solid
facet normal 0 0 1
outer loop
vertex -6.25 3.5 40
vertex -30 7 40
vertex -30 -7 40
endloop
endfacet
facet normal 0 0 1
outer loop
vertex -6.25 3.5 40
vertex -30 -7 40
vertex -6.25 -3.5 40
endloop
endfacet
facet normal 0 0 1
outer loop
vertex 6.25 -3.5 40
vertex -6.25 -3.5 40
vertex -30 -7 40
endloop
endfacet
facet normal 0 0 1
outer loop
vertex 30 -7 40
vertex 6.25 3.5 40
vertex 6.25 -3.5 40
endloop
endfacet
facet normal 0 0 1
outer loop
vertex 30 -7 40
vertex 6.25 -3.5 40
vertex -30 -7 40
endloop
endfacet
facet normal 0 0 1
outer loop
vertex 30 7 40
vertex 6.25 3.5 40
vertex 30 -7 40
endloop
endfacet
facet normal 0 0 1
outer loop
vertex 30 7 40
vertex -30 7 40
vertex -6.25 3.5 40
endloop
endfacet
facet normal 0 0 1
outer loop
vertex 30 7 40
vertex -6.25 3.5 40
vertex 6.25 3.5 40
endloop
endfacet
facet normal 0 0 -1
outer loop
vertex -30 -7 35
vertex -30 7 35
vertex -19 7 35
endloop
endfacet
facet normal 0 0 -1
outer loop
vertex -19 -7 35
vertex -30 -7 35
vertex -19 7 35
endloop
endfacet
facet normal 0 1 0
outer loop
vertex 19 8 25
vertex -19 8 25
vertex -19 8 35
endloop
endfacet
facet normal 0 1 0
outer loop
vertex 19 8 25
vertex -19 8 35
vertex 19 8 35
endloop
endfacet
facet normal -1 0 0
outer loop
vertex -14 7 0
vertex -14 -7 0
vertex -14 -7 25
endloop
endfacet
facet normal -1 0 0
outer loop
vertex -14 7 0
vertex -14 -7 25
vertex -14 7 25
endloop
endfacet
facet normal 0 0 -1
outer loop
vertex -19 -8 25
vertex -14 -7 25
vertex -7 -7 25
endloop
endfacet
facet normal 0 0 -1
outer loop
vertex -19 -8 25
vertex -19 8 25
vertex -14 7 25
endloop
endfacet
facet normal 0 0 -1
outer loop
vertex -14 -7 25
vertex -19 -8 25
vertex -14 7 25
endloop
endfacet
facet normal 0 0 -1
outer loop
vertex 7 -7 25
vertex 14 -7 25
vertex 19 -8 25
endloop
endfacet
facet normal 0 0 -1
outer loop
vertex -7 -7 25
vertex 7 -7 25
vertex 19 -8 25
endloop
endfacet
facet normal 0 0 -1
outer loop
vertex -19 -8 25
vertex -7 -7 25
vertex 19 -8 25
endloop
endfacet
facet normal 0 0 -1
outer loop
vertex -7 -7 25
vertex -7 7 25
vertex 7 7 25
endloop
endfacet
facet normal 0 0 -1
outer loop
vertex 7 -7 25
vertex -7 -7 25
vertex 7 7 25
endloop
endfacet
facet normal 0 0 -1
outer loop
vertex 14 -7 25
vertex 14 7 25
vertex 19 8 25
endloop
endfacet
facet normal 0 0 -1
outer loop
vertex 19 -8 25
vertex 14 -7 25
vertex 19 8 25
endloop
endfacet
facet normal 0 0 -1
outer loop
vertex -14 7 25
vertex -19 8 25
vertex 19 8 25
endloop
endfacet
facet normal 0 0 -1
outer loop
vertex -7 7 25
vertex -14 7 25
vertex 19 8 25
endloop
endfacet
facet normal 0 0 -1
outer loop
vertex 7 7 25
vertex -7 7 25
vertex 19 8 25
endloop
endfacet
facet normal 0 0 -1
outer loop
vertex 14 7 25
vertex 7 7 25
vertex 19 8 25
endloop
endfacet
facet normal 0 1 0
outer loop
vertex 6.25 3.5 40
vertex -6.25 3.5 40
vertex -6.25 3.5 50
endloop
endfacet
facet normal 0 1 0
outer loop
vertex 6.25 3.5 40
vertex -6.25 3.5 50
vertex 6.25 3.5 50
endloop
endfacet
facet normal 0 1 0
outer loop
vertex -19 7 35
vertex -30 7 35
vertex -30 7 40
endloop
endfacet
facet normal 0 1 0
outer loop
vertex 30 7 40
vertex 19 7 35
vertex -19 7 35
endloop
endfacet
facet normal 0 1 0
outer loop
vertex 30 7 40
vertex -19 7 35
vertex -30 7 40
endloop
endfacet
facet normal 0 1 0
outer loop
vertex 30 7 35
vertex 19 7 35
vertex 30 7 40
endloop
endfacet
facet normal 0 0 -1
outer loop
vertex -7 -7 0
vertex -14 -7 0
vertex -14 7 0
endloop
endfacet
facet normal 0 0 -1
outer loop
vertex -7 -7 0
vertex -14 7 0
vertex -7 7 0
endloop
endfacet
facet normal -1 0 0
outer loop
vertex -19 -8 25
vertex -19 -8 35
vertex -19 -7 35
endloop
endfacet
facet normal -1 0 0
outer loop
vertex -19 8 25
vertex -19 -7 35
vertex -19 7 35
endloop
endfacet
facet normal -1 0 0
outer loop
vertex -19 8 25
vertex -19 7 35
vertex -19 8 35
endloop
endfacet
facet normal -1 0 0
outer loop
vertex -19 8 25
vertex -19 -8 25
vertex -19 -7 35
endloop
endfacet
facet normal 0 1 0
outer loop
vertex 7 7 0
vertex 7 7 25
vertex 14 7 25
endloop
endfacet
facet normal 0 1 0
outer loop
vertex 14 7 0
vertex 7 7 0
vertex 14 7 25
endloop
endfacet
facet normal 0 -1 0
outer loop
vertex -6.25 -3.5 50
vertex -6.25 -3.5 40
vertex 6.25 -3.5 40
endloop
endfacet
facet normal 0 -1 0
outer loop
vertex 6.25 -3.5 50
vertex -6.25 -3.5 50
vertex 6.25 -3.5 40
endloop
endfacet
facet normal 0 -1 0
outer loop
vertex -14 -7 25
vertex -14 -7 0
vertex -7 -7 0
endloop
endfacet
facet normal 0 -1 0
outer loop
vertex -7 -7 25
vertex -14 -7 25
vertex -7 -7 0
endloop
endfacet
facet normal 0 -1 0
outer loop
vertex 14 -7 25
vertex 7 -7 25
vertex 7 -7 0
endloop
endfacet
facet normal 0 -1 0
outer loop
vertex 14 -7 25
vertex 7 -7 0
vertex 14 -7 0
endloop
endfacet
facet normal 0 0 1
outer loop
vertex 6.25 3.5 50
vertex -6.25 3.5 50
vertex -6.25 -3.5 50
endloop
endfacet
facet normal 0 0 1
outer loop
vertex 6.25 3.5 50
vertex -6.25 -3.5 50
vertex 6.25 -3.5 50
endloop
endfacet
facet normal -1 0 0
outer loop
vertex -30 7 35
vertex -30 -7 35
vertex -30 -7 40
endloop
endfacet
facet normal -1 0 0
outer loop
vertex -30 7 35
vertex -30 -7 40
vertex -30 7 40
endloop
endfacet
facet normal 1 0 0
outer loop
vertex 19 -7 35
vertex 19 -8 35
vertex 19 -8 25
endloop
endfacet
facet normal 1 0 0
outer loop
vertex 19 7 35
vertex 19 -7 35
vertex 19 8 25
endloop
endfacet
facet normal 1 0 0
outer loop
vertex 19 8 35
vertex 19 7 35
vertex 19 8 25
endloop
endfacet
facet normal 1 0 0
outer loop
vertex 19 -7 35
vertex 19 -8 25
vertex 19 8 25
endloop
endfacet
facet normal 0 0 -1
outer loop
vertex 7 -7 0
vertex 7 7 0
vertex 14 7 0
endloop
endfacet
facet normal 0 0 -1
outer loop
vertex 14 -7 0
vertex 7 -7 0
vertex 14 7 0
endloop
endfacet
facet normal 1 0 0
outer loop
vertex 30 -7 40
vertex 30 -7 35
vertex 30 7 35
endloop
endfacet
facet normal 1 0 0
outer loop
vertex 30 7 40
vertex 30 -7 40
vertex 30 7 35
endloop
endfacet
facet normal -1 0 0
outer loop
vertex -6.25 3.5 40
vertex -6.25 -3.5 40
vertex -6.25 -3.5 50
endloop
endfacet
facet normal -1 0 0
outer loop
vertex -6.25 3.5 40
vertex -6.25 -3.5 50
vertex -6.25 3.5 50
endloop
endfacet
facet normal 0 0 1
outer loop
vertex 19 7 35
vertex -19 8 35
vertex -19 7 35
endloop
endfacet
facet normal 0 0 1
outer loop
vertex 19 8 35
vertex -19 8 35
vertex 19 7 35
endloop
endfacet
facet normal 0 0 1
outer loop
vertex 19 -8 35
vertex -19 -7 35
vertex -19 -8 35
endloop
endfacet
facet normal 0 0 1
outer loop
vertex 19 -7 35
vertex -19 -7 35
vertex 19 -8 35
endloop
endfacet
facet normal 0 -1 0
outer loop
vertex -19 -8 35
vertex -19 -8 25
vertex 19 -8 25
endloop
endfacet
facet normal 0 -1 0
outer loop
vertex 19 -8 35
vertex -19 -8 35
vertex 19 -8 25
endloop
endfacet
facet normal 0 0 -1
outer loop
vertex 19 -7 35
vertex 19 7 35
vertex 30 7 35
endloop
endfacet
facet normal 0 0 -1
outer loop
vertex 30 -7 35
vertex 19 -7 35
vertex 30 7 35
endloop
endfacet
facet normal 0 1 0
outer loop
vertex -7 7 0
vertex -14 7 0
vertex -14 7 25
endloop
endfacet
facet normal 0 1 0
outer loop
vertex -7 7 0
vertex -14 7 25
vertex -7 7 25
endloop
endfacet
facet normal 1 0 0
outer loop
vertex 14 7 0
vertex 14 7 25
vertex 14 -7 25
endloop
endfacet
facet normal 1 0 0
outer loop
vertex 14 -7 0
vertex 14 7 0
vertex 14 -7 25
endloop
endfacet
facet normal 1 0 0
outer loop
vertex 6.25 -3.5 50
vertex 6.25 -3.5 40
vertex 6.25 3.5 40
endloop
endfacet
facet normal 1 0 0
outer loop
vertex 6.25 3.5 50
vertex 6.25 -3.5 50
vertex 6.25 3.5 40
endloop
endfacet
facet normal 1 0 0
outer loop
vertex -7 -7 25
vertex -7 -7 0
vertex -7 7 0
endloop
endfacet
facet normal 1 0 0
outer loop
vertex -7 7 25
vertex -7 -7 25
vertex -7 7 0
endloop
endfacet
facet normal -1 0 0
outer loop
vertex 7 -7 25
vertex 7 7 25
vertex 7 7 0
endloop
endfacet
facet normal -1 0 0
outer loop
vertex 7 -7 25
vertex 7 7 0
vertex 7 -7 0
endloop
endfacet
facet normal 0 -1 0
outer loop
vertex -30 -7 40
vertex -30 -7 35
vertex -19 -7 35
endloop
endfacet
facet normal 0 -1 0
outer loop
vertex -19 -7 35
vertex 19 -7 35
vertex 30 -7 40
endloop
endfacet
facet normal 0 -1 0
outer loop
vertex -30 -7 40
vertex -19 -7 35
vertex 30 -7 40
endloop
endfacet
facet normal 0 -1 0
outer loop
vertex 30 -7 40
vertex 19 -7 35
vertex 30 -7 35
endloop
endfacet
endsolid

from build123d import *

# Parameters (mm, degrees)
F0_W     = 7
F0_H     = 14
F1_DEPTH = 25
F2_W     = 38
F2_H     = 16
F3_DEPTH = 10
F4_W     = 60
F4_H     = 14
F5_DEPTH = 5
F6_W     = 12.5
F6_H     = 7
F7_DEPTH = 10
F8_W     = 7
F8_H     = 14
F9_DEPTH = 25


with BuildPart() as f1:
    # F0 (on Top) → F1 (new body)
    with BuildSketch(Plane.XY):
        with Locations((-10.5, 0)):
            Rectangle(F0_W, F0_H)
    extrude(amount=F1_DEPTH)

    # F2 (on face) → F3 (join)
    with BuildSketch(Plane.XY.offset(25)):
        Rectangle(F2_W, F2_H)
    extrude(amount=F3_DEPTH)

    # F4 (on face) → F5 (join)
    with BuildSketch(Plane.XY.offset(35)):
        Rectangle(F4_W, F4_H)
    extrude(amount=F5_DEPTH)

    # F6 (on face) → F7 (join)
    with BuildSketch(Plane.XY.offset(40)):
        Rectangle(F6_W, F6_H)
    extrude(amount=F7_DEPTH)

    # F8 (on face) → F9 (join, through all)
    with BuildSketch(Plane(origin=(0, 0, 25), x_dir=(1, 0, 0), z_dir=(0, 0, -1))):
        with Locations((10.5, 0)):
            Rectangle(F8_W, F8_H)
    extrude(amount=F9_DEPTH)


solid = f1.part
